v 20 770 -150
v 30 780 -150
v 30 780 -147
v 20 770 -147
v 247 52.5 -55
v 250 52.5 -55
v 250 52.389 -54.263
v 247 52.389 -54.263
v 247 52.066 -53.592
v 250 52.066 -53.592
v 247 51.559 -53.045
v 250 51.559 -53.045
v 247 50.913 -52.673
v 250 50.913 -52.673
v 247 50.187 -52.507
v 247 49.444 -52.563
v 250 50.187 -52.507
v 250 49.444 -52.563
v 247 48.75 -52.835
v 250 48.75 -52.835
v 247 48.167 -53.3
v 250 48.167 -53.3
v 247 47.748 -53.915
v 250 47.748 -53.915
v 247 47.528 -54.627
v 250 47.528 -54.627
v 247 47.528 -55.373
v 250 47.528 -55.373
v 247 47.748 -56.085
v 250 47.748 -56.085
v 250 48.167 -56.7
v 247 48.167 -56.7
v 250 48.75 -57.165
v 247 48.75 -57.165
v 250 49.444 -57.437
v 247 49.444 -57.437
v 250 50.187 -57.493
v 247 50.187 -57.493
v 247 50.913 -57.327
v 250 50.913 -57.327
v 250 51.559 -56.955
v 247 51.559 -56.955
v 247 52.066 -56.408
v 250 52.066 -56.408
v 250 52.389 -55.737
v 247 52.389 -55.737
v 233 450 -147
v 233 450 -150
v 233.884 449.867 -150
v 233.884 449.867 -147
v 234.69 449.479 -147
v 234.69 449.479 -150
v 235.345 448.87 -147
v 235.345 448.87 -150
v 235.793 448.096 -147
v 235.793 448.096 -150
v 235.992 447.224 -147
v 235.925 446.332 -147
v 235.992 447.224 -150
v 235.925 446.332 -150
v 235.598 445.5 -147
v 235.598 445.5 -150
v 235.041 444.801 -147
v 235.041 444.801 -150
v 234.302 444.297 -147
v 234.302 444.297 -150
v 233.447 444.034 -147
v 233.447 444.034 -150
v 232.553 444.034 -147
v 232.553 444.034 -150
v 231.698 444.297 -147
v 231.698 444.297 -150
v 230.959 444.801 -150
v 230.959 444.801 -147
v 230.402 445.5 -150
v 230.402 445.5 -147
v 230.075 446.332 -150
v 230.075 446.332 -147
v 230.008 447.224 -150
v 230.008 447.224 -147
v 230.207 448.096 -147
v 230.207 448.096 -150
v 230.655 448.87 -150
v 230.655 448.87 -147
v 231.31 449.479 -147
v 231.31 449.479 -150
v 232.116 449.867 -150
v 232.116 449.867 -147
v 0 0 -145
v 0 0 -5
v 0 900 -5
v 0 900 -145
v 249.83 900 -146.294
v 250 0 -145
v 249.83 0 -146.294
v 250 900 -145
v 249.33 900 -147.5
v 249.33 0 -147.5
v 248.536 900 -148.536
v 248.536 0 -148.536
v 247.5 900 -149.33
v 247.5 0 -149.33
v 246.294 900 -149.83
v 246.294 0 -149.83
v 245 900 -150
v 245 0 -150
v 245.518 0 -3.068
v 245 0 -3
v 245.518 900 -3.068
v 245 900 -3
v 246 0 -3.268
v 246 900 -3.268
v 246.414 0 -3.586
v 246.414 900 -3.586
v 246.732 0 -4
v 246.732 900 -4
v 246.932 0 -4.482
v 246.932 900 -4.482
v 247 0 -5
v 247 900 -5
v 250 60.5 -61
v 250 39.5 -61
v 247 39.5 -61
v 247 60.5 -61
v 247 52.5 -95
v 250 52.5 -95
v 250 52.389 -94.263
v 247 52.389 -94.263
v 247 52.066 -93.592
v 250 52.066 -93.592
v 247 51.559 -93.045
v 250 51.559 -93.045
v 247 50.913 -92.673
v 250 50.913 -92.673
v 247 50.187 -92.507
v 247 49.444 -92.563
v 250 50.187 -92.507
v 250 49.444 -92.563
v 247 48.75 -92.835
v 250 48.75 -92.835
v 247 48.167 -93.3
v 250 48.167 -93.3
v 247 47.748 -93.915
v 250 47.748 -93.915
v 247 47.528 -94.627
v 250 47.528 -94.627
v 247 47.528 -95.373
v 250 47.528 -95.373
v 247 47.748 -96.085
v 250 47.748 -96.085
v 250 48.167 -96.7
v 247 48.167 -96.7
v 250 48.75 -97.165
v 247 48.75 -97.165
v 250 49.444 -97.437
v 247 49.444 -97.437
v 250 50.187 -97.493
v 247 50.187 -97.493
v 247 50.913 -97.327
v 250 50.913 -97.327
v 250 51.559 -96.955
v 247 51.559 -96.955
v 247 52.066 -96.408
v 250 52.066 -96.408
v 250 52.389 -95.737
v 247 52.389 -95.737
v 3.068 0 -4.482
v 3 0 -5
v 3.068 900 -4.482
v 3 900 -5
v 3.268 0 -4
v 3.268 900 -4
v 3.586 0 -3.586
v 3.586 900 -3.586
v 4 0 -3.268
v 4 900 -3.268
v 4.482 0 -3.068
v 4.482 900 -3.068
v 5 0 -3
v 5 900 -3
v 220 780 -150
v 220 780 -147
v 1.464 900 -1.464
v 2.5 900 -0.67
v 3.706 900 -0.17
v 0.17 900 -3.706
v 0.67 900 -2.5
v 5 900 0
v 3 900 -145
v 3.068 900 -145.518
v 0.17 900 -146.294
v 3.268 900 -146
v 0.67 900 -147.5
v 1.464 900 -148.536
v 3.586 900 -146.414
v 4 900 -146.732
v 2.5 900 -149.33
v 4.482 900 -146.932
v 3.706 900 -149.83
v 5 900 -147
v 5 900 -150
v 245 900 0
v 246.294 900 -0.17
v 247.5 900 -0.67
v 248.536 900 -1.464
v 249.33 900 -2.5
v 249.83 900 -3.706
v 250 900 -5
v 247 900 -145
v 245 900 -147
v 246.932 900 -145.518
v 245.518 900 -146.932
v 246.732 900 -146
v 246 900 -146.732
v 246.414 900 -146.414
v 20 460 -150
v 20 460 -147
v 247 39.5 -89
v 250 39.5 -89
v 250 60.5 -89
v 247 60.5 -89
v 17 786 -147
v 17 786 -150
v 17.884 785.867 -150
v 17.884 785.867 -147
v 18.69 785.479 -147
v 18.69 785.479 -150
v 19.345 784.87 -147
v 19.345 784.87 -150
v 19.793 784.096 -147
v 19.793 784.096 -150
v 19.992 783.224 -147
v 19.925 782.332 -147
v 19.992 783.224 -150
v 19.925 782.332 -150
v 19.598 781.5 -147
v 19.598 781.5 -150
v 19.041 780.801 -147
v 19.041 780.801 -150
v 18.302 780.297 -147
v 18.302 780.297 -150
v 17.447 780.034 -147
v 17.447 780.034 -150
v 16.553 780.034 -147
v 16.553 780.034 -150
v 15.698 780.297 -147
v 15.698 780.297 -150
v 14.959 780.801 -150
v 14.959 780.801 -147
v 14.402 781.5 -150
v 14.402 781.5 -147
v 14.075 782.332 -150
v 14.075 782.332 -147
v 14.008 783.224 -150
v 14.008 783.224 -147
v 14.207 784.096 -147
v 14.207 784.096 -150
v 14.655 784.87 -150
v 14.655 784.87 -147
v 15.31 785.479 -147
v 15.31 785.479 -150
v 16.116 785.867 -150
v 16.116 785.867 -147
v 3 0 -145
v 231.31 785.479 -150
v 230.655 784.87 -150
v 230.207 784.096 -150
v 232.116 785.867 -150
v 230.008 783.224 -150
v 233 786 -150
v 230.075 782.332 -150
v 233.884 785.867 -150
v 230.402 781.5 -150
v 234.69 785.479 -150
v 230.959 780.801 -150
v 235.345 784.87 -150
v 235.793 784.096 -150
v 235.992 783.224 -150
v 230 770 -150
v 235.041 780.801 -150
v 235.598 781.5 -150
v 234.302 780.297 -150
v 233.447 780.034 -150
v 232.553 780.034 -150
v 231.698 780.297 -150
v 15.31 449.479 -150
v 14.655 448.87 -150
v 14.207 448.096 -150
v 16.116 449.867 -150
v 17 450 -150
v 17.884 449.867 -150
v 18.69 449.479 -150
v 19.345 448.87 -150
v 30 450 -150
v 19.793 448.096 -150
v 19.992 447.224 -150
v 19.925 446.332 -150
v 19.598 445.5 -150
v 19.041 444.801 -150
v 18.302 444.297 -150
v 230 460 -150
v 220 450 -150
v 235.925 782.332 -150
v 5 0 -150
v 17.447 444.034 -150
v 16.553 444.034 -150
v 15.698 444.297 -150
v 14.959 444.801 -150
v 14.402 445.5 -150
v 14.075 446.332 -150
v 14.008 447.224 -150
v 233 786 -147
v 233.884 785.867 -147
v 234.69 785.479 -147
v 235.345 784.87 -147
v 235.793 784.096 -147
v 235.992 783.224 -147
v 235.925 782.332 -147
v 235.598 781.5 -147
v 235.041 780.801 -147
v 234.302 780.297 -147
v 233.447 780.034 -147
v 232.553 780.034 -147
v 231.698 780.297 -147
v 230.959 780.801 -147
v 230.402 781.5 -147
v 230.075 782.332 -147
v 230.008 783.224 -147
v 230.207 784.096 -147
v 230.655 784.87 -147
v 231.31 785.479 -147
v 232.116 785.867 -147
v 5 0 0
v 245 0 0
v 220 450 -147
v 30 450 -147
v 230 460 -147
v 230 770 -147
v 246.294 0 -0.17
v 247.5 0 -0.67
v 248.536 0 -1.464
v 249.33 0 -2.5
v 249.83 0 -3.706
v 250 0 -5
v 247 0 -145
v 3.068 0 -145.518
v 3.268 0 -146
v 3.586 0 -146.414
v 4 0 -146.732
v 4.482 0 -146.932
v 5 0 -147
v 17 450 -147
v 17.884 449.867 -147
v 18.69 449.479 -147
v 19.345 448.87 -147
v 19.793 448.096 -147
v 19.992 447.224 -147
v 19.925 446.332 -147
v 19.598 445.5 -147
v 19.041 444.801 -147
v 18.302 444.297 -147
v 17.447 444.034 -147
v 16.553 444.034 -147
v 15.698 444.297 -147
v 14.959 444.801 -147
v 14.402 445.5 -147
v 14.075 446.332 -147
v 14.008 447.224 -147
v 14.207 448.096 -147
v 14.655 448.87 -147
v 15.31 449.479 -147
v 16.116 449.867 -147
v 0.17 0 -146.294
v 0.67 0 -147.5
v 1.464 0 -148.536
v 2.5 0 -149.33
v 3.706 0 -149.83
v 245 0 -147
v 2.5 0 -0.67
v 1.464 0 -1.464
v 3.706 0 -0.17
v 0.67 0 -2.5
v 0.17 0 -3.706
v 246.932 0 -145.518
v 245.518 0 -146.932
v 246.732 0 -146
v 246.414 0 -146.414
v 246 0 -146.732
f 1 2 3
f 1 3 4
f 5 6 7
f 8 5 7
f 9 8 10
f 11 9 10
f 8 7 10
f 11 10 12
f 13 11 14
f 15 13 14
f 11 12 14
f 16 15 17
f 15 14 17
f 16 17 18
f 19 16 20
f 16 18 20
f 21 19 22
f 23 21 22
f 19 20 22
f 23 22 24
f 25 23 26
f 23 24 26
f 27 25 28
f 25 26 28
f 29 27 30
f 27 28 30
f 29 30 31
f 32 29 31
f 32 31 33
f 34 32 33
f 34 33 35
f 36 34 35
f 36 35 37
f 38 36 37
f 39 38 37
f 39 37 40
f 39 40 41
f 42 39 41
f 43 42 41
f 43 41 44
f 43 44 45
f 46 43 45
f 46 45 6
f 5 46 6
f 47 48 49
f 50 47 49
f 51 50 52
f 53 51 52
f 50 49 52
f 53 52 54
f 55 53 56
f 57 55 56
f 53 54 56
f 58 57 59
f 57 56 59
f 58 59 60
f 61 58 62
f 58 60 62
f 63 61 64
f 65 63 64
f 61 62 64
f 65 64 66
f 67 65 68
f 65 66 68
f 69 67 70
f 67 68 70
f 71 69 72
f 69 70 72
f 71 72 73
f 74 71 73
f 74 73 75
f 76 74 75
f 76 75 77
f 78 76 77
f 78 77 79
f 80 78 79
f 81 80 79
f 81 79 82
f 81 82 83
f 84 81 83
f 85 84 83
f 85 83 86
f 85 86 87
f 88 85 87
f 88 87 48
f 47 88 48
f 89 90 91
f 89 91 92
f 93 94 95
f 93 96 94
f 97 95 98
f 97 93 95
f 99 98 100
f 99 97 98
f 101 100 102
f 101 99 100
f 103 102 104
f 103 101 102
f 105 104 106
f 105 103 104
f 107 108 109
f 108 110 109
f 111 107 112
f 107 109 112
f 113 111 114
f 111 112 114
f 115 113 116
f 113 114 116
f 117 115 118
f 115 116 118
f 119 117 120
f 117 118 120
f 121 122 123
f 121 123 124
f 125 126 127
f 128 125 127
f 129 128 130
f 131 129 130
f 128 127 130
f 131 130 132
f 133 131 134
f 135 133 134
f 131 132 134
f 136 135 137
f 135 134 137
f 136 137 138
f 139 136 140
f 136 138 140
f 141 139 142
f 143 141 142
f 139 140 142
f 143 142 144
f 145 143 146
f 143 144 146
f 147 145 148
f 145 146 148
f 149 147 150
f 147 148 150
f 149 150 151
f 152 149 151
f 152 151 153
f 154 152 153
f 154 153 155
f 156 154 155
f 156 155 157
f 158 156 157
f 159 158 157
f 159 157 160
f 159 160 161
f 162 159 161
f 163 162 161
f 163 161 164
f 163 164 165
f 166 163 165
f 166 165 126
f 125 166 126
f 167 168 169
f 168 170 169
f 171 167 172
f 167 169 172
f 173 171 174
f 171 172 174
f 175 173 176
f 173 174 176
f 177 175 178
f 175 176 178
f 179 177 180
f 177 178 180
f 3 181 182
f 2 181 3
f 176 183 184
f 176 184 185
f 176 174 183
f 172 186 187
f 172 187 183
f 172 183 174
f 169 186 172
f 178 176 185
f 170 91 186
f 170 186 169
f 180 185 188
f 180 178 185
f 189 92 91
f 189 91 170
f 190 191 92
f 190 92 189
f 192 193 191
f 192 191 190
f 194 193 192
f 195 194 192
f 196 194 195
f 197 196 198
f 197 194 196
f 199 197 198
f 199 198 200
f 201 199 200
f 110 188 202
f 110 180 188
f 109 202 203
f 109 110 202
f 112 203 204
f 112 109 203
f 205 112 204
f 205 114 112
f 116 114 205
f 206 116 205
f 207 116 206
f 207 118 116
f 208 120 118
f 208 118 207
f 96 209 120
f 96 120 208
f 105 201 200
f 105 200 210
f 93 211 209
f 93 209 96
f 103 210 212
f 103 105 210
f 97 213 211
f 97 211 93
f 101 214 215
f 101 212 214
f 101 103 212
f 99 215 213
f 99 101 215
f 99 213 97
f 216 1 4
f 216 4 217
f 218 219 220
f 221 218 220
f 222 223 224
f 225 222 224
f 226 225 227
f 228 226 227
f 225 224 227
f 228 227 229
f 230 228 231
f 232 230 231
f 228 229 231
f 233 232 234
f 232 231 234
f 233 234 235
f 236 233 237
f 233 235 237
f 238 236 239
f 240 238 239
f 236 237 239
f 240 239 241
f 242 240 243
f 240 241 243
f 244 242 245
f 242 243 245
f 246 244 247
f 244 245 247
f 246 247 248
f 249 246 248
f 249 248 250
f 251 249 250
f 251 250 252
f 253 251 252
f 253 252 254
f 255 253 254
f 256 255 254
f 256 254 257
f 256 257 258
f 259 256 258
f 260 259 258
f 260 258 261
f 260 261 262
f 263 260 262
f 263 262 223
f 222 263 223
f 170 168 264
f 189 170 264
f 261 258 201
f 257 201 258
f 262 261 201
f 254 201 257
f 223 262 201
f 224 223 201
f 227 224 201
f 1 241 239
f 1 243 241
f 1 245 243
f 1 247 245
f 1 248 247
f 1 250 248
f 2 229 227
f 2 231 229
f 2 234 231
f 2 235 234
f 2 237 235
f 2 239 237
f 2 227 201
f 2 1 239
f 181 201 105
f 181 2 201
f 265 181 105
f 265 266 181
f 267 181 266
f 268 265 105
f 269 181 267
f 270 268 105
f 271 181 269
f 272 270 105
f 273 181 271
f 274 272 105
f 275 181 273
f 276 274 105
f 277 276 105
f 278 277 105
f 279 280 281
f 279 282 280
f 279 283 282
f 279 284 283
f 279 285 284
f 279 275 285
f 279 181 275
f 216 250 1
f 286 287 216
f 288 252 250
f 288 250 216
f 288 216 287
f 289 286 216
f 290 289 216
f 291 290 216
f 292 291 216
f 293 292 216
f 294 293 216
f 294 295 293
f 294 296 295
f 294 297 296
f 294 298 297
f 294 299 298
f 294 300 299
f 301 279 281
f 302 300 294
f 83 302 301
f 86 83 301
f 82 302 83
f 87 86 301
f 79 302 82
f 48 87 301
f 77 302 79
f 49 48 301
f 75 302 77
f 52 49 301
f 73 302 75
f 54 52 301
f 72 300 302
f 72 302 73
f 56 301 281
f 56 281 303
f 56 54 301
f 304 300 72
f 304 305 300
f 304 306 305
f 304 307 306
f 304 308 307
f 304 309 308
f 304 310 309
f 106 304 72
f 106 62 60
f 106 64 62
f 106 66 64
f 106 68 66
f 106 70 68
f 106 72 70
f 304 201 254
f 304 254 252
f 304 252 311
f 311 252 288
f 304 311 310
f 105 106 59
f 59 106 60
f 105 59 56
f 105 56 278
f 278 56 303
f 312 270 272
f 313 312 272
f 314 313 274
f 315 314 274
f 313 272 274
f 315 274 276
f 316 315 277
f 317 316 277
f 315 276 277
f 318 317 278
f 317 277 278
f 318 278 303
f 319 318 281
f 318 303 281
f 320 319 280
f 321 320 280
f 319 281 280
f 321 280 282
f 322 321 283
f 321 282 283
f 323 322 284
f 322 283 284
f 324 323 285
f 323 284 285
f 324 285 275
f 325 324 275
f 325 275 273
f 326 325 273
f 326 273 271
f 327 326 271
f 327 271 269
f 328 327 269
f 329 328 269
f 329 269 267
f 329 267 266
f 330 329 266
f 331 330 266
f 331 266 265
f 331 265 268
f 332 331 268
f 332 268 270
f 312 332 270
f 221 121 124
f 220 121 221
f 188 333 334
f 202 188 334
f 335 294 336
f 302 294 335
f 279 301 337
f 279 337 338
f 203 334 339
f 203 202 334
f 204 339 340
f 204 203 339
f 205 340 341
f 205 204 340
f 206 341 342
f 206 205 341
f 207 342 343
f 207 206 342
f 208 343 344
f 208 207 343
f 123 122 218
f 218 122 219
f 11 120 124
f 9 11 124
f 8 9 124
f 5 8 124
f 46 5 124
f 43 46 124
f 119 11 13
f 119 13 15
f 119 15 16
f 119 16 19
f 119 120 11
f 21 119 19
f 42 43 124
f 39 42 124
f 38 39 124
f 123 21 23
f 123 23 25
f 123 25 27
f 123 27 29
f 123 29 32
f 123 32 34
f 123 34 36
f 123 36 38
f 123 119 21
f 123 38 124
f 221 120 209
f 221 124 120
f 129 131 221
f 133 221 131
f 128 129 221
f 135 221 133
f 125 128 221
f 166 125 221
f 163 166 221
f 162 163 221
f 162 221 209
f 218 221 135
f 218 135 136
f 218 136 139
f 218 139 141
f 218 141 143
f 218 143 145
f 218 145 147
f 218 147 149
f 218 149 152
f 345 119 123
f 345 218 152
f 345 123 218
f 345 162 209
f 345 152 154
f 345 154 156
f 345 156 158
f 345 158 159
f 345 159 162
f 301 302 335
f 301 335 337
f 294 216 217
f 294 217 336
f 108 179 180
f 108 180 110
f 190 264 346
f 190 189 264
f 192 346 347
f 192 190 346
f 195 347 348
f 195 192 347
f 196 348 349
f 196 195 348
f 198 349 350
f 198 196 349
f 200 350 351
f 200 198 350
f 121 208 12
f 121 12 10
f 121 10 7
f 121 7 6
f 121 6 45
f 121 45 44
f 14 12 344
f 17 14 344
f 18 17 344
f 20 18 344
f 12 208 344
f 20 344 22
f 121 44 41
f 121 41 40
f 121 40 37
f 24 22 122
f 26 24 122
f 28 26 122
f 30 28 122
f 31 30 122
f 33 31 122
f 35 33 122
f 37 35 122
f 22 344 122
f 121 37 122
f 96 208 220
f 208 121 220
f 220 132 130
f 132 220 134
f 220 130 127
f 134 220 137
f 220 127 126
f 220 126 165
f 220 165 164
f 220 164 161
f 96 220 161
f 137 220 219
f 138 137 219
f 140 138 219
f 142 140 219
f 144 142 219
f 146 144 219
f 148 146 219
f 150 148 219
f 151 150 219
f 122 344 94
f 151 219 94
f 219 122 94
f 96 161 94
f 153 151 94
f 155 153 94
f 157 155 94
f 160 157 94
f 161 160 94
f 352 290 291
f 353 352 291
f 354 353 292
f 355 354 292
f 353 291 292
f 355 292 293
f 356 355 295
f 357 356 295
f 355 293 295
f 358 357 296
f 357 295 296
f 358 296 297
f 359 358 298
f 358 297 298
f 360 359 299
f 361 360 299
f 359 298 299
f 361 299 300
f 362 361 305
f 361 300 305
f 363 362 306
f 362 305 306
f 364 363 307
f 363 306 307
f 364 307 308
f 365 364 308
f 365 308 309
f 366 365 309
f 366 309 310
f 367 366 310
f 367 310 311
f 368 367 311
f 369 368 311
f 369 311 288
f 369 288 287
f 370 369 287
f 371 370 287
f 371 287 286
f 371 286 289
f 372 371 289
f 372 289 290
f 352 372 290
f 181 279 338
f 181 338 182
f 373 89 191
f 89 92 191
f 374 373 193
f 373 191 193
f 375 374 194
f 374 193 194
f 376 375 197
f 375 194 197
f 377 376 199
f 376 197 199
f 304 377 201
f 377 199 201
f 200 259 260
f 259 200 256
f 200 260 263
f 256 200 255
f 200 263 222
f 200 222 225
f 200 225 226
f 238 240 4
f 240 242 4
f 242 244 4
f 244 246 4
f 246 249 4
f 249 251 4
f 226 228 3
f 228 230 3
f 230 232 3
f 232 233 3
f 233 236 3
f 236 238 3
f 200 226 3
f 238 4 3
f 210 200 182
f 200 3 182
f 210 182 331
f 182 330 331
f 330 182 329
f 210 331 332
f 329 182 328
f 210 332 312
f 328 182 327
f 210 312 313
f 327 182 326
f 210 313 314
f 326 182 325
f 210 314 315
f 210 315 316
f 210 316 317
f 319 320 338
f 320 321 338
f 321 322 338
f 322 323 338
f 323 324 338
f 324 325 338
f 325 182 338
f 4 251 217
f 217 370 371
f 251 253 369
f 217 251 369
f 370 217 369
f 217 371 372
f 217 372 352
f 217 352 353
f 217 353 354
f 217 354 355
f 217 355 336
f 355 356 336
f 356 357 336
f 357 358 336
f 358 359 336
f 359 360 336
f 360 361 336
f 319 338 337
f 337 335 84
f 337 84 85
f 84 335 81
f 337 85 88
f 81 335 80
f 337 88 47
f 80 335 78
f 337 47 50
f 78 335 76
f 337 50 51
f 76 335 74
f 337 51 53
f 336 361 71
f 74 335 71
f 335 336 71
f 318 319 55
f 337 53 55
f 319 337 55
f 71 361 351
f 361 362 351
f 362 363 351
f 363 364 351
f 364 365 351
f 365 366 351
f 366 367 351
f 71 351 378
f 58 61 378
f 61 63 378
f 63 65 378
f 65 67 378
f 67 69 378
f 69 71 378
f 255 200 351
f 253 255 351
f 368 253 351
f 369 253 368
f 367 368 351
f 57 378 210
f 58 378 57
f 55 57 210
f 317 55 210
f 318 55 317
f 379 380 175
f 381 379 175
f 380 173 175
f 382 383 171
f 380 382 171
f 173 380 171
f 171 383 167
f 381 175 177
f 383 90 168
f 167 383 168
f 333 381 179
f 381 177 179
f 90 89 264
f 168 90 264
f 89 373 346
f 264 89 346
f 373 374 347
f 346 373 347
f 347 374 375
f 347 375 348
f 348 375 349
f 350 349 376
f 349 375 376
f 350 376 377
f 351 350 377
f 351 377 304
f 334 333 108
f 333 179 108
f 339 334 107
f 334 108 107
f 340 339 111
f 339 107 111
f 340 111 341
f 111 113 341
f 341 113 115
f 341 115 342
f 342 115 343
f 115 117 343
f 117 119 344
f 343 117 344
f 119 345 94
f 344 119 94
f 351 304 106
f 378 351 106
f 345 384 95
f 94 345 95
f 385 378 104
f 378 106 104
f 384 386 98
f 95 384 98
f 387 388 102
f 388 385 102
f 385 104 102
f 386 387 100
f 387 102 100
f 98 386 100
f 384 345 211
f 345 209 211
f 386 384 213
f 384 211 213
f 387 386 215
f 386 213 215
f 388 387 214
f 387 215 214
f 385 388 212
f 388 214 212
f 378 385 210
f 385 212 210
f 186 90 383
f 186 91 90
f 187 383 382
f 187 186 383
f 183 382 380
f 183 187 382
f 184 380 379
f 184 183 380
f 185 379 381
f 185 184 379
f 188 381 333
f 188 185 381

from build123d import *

# Parameters (mm, degrees)
ESQUISSE1_W             = 250
ESQUISSE1_H             = 150
BASE_EXTRUSION_DEPTH    = 900
CONG_2_R                = 5
COQUE1_T                = -3
ENL_V_MAT_EXTRU_2_DEPTH = 10
ESQUISSE4_R             = 3
ENL_V_MAT_EXTRU_3_DEPTH = 10
ESQUISSE6_R             = 2.5
ESQUISSE6_W             = 28
ESQUISSE6_H             = 21
ENL_V_MAT_EXTRU_4_DEPTH = 8


with BuildPart() as part:
    # Esquisse1 → Base-Extrusion (new body)
    with BuildSketch(Plane(origin=(0, 0, 0), x_dir=(1, 0, 0), z_dir=(0, 1, 0))):
        with Locations((125, 75)):
            Rectangle(ESQUISSE1_W, ESQUISSE1_H)
    extrude(amount=BASE_EXTRUSION_DEPTH)

    # Congé2
    cong_2_edges = [part.edges().sort_by_distance(p)[0] for p in [
        (0, 450, 0),
        (250, 450, 0),
        (250, 450, -150),
        (0, 450, -150),
    ]]
    fillet(cong_2_edges, radius=CONG_2_R)

    # Coque1
    coque1_openings = [part.faces().sort_by_distance(p)[0] for p in [
        (125, 0, -75),
        (125, 900, -75),
    ]]
    offset(amount=COQUE1_T, openings=coque1_openings, kind=Kind.INTERSECTION)

    # Esquisse3 → Enlèv. mat.-Extru.2 (cut)
    with BuildSketch(Plane(origin=(0, 0, -150), x_dir=(-1, 0, 0), z_dir=(0, 0, -1))):
        Polygon((-230, 770), (-220, 780), (-30, 780), (-20, 770), (-20, 460), (-30, 450), (-220, 450), (-230, 460), align=None)
    extrude(amount=-ENL_V_MAT_EXTRU_2_DEPTH, mode=Mode.SUBTRACT)

    # Esquisse4 → Enlèv. mat.-Extru.3 (cut)
    with BuildSketch(Plane(origin=(0, 0, -150), x_dir=(-1, 0, 0), z_dir=(0, 0, -1))):
        with Locations(Location((-17, 783, 0), (0, 0, 90))):
            Circle(ESQUISSE4_R)
        with Locations(Location((-17, 447, 0), (0, 0, 90))):
            Circle(ESQUISSE4_R)
        with Locations(Location((-233, 783, 0), (0, 0, 90))):
            Circle(ESQUISSE4_R)
        with Locations(Location((-233, 447, 0), (0, 0, 90))):
            Circle(ESQUISSE4_R)
    extrude(amount=-ENL_V_MAT_EXTRU_3_DEPTH, mode=Mode.SUBTRACT)

    # Esquisse6 → Enlèv. mat.-Extru.4 (cut)
    with BuildSketch(Plane(origin=(250, 0, 0), x_dir=(0, 0, -1), z_dir=(1, 0, 0))):
        with Locations(Location((95, 50, 0), (0, 0, 90))):
            Circle(ESQUISSE6_R)
        with Locations(Location((55, 50, 0), (0, 0, 90))):
            Circle(ESQUISSE6_R)
        with Locations((75, 50)):
            Rectangle(ESQUISSE6_W, ESQUISSE6_H)
    extrude(amount=-ENL_V_MAT_EXTRU_4_DEPTH, mode=Mode.SUBTRACT)


solid = part.part
